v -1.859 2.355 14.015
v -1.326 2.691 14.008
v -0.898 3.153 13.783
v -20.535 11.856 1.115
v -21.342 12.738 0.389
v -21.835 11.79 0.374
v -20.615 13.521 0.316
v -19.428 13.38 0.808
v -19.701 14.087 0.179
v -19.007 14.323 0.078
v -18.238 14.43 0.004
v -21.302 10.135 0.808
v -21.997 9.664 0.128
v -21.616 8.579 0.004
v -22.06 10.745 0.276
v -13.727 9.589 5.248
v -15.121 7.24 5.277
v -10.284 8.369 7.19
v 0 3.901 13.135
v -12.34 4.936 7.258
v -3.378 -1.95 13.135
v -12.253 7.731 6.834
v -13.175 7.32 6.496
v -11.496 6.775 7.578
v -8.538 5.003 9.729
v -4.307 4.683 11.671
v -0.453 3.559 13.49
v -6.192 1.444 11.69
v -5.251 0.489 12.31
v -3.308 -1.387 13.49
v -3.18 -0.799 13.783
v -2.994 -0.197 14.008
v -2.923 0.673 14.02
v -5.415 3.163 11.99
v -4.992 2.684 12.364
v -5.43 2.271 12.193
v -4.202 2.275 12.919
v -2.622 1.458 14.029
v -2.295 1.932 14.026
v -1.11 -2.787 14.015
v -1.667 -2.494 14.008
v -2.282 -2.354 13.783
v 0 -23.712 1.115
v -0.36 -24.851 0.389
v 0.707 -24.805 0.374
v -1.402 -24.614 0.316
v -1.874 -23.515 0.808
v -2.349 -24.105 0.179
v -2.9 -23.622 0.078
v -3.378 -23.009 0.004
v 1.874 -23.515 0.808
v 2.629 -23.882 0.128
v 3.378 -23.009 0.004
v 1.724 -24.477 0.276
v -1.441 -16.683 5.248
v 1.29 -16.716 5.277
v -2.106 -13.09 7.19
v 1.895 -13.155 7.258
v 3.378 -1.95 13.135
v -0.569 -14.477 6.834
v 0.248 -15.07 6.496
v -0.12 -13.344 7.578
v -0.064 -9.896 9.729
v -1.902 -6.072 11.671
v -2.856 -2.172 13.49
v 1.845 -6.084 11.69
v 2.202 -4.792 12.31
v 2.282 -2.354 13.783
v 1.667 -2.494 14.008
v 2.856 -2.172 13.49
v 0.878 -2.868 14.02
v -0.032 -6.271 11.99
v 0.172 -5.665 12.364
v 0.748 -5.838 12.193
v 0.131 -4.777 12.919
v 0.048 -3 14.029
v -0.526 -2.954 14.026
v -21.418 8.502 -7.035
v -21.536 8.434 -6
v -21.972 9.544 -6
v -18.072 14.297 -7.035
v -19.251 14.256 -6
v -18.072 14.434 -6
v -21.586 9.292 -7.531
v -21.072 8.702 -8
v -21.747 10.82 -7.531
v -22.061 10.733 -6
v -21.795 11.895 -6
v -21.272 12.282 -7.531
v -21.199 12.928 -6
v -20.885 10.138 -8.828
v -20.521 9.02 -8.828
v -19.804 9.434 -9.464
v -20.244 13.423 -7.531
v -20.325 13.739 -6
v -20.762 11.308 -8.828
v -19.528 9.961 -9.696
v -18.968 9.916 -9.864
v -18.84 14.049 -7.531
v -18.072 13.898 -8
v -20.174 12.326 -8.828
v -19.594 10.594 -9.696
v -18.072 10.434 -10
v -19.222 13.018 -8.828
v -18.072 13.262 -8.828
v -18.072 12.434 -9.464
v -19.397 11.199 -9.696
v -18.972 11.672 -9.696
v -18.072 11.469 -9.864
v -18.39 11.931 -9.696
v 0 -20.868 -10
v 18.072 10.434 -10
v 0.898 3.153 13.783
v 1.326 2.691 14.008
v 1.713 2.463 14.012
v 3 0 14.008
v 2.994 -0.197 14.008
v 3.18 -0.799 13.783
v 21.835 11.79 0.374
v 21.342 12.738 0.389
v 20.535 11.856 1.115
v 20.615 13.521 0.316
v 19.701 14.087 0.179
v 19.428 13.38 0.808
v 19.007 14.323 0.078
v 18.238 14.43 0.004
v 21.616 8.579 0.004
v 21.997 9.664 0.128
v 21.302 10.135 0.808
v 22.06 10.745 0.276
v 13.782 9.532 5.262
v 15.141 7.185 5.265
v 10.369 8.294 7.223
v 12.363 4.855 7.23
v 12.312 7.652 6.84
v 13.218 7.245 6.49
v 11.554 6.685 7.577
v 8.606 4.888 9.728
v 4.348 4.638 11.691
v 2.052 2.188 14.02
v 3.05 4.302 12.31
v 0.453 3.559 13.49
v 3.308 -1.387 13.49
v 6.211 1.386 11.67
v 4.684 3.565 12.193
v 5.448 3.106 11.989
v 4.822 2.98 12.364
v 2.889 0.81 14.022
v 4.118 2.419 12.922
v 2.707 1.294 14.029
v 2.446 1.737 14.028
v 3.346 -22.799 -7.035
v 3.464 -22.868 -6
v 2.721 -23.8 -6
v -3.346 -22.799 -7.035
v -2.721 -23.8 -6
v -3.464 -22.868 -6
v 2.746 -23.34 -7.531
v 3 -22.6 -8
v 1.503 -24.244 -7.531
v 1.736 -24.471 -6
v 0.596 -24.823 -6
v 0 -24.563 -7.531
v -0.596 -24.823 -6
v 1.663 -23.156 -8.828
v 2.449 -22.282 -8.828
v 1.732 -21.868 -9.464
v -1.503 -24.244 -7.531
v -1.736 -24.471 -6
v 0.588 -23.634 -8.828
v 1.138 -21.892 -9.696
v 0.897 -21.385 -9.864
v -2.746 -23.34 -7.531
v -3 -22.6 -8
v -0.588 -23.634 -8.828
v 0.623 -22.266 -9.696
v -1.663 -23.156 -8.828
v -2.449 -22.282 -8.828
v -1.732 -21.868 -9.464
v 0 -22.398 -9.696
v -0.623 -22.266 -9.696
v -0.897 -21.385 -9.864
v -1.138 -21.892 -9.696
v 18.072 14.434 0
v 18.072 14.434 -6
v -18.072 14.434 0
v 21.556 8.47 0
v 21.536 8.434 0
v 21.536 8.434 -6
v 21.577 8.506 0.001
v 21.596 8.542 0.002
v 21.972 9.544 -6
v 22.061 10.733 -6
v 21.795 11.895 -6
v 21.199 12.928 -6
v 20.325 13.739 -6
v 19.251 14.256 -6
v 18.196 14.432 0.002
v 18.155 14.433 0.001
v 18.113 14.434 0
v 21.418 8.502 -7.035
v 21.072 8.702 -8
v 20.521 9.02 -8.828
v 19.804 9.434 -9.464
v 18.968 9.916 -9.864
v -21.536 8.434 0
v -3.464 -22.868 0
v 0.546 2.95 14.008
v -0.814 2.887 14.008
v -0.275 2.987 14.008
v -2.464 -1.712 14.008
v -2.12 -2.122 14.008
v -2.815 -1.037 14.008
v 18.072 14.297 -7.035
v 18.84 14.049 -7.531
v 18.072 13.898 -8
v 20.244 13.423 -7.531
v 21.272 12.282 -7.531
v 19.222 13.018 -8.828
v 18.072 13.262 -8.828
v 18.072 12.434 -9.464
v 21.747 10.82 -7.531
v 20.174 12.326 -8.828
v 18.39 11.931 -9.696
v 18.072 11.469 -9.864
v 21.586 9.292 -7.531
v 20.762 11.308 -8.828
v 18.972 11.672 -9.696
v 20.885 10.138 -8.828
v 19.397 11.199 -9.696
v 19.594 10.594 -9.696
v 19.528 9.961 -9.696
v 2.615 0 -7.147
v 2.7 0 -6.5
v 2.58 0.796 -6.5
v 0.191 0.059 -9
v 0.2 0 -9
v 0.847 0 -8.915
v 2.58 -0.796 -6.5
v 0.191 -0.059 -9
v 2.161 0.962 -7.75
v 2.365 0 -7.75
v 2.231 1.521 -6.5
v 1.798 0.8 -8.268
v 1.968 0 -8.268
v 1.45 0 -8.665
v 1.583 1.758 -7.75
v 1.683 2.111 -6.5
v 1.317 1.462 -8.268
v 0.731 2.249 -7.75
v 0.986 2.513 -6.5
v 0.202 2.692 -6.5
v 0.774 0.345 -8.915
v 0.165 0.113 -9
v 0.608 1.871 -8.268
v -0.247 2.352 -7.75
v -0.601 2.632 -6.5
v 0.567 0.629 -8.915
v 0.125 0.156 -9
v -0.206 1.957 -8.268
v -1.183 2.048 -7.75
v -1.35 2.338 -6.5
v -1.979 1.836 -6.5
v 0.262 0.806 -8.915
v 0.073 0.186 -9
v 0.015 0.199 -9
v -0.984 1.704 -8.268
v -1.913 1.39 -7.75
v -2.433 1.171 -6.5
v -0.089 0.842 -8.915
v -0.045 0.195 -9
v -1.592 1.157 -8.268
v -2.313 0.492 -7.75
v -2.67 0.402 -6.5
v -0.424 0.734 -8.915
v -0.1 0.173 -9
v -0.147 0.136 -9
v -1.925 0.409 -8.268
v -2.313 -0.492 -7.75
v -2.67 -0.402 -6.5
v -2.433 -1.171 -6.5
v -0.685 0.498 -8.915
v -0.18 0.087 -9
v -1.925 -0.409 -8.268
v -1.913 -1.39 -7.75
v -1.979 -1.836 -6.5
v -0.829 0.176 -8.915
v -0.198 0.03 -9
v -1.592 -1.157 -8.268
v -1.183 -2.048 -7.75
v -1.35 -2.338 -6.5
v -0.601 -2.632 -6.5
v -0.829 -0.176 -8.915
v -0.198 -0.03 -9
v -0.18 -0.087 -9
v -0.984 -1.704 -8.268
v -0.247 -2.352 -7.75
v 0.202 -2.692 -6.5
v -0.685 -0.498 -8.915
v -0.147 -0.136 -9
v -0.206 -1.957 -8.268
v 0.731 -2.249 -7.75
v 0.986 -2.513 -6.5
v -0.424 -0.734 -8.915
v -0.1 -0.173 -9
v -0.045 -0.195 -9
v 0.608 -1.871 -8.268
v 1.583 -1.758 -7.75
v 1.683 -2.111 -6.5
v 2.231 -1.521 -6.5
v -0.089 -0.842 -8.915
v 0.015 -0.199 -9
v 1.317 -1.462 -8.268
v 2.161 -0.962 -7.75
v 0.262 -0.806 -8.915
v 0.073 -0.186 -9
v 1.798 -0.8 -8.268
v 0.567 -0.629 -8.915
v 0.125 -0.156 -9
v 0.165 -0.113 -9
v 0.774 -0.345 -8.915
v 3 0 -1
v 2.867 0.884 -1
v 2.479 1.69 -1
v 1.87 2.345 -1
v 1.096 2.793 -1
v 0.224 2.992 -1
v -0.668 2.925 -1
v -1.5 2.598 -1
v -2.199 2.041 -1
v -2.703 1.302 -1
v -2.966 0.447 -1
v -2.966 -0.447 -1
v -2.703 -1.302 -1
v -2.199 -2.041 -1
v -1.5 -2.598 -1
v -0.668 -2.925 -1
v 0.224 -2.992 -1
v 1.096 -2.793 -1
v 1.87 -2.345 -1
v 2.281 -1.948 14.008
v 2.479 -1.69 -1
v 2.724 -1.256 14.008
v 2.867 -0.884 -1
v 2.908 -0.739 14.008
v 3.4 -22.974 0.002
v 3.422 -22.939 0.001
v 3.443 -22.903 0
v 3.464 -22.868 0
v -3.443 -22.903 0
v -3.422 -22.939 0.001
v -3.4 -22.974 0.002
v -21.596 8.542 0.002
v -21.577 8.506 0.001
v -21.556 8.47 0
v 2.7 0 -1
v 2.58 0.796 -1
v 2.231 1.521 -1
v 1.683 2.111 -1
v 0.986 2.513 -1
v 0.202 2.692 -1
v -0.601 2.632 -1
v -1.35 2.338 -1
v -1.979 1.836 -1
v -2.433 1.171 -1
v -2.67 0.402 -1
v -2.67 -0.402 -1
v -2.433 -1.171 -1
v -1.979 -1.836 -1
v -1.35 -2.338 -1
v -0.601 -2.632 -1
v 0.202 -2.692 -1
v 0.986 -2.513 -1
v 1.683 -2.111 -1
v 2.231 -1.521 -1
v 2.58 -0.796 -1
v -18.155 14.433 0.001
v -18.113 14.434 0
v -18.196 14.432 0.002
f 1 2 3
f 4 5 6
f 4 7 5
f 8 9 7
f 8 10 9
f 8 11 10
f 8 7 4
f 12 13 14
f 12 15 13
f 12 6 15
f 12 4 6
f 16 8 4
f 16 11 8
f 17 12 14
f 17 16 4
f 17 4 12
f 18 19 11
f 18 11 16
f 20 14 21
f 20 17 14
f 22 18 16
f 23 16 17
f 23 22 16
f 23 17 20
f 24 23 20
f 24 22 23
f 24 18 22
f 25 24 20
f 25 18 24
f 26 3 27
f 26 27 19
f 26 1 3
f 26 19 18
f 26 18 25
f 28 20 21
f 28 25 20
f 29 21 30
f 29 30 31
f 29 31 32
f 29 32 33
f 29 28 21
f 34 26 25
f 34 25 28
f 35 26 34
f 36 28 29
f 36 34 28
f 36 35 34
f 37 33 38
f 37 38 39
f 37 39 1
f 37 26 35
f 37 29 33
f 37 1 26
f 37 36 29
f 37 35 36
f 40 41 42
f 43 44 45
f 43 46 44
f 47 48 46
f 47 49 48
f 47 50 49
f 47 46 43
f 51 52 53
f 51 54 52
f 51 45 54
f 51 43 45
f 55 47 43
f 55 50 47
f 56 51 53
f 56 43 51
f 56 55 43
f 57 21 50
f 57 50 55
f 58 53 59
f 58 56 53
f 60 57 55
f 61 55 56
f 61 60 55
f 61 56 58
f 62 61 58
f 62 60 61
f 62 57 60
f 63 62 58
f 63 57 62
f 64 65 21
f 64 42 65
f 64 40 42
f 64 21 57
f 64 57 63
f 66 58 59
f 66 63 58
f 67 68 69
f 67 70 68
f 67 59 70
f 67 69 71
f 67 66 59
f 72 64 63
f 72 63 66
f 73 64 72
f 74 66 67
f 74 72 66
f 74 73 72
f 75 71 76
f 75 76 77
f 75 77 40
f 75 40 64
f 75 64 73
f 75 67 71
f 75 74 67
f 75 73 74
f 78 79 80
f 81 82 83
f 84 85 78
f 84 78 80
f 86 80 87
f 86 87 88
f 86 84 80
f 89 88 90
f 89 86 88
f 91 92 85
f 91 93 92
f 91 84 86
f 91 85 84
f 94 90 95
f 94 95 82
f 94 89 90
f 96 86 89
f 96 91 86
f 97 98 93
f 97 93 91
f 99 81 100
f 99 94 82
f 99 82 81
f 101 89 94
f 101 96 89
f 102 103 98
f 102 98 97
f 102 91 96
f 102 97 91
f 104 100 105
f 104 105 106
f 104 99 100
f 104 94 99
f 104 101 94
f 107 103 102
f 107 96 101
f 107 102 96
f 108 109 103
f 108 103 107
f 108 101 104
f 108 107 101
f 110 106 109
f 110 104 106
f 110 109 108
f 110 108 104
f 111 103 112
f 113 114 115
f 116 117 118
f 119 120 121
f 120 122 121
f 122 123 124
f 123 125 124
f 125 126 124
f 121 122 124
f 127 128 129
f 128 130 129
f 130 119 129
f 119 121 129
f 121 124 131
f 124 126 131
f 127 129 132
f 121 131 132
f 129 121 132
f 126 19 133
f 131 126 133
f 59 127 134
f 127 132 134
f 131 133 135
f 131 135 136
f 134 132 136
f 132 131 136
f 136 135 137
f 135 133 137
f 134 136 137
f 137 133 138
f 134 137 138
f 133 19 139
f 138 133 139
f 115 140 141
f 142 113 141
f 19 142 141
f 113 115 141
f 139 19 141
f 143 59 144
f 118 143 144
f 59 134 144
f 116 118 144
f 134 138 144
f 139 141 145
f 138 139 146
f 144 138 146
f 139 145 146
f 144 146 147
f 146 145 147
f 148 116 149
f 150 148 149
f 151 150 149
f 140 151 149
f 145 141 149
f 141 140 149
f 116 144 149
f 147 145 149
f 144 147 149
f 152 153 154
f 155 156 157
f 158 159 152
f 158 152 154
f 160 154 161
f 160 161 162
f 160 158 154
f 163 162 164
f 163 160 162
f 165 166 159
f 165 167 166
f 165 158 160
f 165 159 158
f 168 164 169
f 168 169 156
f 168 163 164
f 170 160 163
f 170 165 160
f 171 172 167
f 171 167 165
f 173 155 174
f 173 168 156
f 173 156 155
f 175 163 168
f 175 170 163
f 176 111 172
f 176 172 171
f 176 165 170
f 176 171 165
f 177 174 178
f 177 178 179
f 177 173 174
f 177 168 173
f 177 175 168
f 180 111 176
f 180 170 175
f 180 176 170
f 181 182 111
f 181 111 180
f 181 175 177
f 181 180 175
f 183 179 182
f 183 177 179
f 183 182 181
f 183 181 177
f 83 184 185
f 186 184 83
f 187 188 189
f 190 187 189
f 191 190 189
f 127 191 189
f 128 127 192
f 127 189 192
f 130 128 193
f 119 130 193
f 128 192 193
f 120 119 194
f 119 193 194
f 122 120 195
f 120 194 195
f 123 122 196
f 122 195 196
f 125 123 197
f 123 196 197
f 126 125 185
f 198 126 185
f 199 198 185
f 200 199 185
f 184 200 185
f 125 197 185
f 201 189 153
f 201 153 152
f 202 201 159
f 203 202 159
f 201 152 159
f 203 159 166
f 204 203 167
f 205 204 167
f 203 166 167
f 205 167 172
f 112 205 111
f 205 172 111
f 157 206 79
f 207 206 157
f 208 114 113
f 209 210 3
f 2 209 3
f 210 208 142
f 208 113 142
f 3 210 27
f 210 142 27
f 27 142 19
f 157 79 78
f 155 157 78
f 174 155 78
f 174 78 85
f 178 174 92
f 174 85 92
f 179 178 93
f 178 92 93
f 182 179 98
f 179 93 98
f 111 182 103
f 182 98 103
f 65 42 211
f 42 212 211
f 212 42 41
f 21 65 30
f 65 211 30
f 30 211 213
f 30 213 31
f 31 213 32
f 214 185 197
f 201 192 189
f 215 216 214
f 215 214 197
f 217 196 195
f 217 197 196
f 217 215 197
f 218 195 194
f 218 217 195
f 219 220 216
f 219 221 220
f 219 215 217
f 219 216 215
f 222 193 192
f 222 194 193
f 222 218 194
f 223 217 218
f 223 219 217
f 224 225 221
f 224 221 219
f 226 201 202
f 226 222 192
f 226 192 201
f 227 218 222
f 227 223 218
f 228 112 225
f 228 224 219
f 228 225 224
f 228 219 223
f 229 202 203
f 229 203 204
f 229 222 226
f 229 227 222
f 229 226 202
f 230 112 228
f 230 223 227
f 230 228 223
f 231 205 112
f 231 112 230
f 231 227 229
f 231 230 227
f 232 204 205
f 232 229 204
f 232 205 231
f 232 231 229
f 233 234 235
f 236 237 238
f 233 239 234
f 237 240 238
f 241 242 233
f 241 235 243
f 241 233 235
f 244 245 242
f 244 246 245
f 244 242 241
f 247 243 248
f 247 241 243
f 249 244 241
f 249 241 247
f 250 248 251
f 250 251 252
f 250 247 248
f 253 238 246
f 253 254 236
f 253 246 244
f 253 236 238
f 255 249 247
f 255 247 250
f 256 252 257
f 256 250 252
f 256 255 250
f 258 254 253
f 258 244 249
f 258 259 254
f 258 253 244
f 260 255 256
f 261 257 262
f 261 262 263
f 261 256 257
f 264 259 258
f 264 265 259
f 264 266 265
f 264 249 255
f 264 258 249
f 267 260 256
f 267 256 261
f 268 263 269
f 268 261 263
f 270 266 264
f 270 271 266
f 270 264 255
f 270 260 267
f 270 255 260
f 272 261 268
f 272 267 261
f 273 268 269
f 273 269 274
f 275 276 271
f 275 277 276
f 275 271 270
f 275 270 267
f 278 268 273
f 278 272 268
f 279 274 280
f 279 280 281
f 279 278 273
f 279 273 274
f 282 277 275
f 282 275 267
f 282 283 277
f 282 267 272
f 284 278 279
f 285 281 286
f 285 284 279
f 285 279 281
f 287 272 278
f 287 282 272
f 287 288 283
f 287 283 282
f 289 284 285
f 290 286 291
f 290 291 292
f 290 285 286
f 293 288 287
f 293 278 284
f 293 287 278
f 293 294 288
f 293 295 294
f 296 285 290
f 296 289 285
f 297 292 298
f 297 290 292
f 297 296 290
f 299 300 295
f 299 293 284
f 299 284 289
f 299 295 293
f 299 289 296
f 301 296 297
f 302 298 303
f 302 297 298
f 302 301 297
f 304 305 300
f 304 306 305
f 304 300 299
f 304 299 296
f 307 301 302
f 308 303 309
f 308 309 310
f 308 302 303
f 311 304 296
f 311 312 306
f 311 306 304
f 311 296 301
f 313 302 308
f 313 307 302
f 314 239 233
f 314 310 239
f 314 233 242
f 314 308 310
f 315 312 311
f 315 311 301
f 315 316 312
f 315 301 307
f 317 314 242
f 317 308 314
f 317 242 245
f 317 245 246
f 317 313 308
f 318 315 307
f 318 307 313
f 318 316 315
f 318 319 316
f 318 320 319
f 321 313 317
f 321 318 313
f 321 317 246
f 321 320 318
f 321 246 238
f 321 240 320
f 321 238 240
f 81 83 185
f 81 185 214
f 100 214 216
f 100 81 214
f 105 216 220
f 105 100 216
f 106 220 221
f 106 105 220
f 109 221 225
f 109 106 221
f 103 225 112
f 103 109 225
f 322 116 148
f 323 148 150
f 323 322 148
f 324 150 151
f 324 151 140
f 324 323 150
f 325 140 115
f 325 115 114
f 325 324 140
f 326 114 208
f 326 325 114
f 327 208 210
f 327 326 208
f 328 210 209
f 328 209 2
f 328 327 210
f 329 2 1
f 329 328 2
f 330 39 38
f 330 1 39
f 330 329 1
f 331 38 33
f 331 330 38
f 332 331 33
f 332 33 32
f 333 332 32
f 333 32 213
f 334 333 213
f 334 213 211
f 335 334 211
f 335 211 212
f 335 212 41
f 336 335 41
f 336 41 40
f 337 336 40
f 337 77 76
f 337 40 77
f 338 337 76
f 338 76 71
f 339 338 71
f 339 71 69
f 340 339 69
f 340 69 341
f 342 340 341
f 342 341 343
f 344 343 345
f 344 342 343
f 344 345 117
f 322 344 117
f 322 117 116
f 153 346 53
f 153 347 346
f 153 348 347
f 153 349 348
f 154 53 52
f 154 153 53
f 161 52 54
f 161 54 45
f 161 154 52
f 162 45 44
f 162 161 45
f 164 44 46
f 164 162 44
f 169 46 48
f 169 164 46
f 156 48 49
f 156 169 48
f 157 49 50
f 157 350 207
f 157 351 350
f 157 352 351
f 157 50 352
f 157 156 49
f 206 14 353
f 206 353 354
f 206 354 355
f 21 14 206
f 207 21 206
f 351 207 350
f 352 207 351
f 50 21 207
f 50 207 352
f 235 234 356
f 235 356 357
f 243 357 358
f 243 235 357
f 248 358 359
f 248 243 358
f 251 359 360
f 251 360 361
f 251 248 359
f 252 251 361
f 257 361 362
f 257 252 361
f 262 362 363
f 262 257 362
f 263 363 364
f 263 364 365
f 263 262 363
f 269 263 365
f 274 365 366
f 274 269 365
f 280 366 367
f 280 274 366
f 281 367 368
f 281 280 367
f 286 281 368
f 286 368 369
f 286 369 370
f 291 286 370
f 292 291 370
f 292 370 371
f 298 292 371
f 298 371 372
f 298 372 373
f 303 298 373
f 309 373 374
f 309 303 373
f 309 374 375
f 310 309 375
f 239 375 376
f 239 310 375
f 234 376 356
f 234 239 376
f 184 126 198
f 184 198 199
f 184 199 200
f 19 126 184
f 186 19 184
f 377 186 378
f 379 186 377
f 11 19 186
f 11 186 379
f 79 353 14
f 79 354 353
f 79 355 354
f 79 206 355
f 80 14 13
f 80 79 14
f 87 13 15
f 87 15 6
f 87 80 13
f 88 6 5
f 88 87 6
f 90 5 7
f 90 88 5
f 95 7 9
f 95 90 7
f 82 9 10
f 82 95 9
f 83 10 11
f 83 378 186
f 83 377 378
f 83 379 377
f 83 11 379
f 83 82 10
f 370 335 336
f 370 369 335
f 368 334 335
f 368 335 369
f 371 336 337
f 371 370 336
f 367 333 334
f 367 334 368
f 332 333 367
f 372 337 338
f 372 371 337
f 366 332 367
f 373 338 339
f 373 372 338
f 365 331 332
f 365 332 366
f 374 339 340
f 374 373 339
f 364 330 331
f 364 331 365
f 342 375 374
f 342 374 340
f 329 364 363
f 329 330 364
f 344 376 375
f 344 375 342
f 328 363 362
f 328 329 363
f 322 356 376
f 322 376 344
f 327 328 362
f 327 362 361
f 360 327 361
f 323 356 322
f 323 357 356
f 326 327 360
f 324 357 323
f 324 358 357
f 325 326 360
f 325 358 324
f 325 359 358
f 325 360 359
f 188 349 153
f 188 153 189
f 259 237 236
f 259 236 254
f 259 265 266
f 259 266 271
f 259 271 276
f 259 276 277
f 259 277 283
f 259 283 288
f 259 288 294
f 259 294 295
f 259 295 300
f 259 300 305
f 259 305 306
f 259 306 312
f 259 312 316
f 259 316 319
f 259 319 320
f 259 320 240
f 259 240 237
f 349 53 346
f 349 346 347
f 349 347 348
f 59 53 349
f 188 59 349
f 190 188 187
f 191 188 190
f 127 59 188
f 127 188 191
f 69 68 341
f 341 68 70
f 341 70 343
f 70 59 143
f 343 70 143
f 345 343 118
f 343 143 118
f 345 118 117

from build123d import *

# Parameters (mm, degrees)
F4_R          = 5
F9_DEPTH      = 10
F10_T1_DEPTH  = 23.3205080757
F10_T3_DEPTH  = 36.1435935394
F10_T5_DEPTH  = 36.1435935394
F10_T7_DEPTH  = 36.1435935394
F10_T12_DEPTH = 4
F10_T18_DEPTH = 4
F10_T24_DEPTH = 4
F6_R          = 2.7
F11_DEPTH     = 8
F8_R          = 3
F12_DEPTH     = 25
F13_R         = 2.5


# Not quite as in the source:
# - a fillet or chamfer that OpenCascade refuses, or shapes differently, is made with other operations: its cross-section is extruded or revolved along the edge and cut away or added


with BuildPart() as f3:
    # F0 (on Top) → F3 section 0
    with BuildSketch(Plane.XY, mode=Mode.PRIVATE) as f3_s0:
        Polygon((25, 14.4337567297), (-25, 14.4337567297), (0, -28.8675134595), align=None)
    loft([f3_s0.sketch, Vertex(0, 0, 18)])

    # F4
    f4_edges = [f3.edges().sort_by_distance(p)[0] for p in [
        (12.5, 7.216878, 9),
        (0, -14.433757, 9),
        (-12.5, 7.216878, 9),
    ]]
    fillet(f4_edges, radius=F4_R)

    # F0 (on Top) → F9 (join)
    with BuildSketch(Plane.XY):
        Polygon((25, 14.4337567297), (-25, 14.4337567297), (0, -28.8675134595), align=None)
    extrude(amount=-F9_DEPTH)

    # F10: fillet of radius 4 on 6 edges, made by hand

    # F10_s2 → F10_t1 (cut)
    with BuildSketch(Plane.XY.offset(-6)):
        with BuildLine():
            ThreePointArc((21.5358983849, 8.4337567297), (21.5358983849, 12.4337567297), (18.0717967697, 14.4337567297))
            Line((18.0717967697, 14.4337567297), (25, 14.4337567297))
            Line((25, 14.4337567297), (21.5358983849, 8.4337567297))
        make_face()
        with BuildLine():
            ThreePointArc((-21.5358983849, 8.4337567297), (-21.5358983849, 12.4337567297), (-18.0717967697, 14.4337567297))
            Line((-18.0717967697, 14.4337567297), (-25, 14.4337567297))
            Line((-25, 14.4337567297), (-21.5358983849, 8.4337567297))
        make_face()
        with BuildLine():
            ThreePointArc((3.4641016151, -22.8675134595), (0, -24.8675134595), (-3.4641016151, -22.8675134595))
            Line((-3.4641016151, -22.8675134595), (0, -28.8675134595))
            Line((0, -28.8675134595), (3.4641016151, -22.8675134595))
        make_face()
    extrude(amount=F10_T1_DEPTH, mode=Mode.SUBTRACT)

    # F10_s4 → F10_t3 (cut)
    with BuildSketch(Plane.YZ.offset(-18.0717967697)):
        with BuildLine():
            ThreePointArc((14.4337567297, -6), (13.2621838545, -8.8284271247), (10.4337567297, -10))
            Line((10.4337567297, -10), (14.4337567297, -10))
            Line((14.4337567297, -10), (14.4337567297, -6))
        make_face()
    extrude(amount=F10_T3_DEPTH, mode=Mode.SUBTRACT)

    # F10_s6 → F10_t5 (cut)
    with BuildSketch(Plane(origin=(-9.0358983849, 15.6506350946, 0), x_dir=(0, 0, 1), z_dir=(0.5, -0.8660254038, 0))):
        with BuildLine():
            ThreePointArc((-6, 14.4337567297), (-8.8284271247, 13.2621838545), (-10, 10.4337567297))
            Line((-10, 10.4337567297), (-10, 14.4337567297))
            Line((-10, 14.4337567297), (-6, 14.4337567297))
        make_face()
    extrude(amount=F10_T5_DEPTH, mode=Mode.SUBTRACT)

    # F10_s8 → F10_t7 (cut)
    with BuildSketch(Plane(origin=(-9.0358983849, -15.6506350946, 0), x_dir=(0, 0, 1), z_dir=(0.5, 0.8660254038, 0))):
        with BuildLine():
            ThreePointArc((-6, 14.4337567297), (-8.8284271247, 13.2621838545), (-10, 10.4337567297))
            Line((-10, 10.4337567297), (-10, 14.4337567297))
            Line((-10, 14.4337567297), (-6, 14.4337567297))
        make_face()
    extrude(amount=F10_T7_DEPTH, mode=Mode.SUBTRACT)


with BuildPart() as f10_tool10:
    # F10_s11 → F10_t12 (new body)
    with BuildSketch(Plane.XY.offset(-6)):
        Polygon((18.0717967697, 10.4337567297), (21.5358983849, 8.4337567297), (25, 14.4337567297), (18.0717967697, 14.4337567297), align=None)
    extrude(amount=-F10_T12_DEPTH)

    # F10_s13 → F10_t14 (revolve, cut)
    with BuildSketch(Plane(origin=(18.0717967697, 10.4337567297, -6), x_dir=(-0.8660254038, -0.5, 0), z_dir=(0.5, -0.8660254038, 0))):
        with BuildLine():
            ThreePointArc((0, -4), (4, 0), (0, 4))
            Line((0, 4), (0, -4))
        make_face()
    revolve(axis=Axis((18.0717967697, 10.4337567297, -6), (0, 0, -1)), mode=Mode.SUBTRACT)


with BuildPart() as f3_1:
    add(f3.part)

    # F10_t9: cut F10_tool10
    add(f10_tool10.part, mode=Mode.SUBTRACT)


with BuildPart() as f10_tool16:
    # F10_s17 → F10_t18 (new body)
    with BuildSketch(Plane.XY.offset(-6)):
        Polygon((-18.0717967697, 10.4337567297), (-21.5358983849, 8.4337567297), (-25, 14.4337567297), (-18.0717967697, 14.4337567297), align=None)
    extrude(amount=-F10_T18_DEPTH)

    # F10_s19 → F10_t20 (revolve, cut)
    with BuildSketch(Plane(origin=(-18.0717967697, 10.4337567297, -6), x_dir=(0.8660254038, -0.5, 0), z_dir=(0.5, 0.8660254038, 0))):
        with BuildLine():
            ThreePointArc((0, -4), (4, 0), (0, 4))
            Line((0, 4), (0, -4))
        make_face()
    revolve(axis=Axis((-18.0717967697, 10.4337567297, -6), (0, 0, -1)), mode=Mode.SUBTRACT)


with BuildPart() as f3_2:
    add(f3_1.part)

    # F10_t15: cut F10_tool16
    add(f10_tool16.part, mode=Mode.SUBTRACT)


with BuildPart() as f10_tool22:
    # F10_s23 → F10_t24 (new body)
    with BuildSketch(Plane.XY.offset(-6)):
        Polygon((0, -20.8675134595), (3.4641016151, -22.8675134595), (0, -28.8675134595), (-3.4641016151, -22.8675134595), align=None)
    extrude(amount=-F10_T24_DEPTH)

    # F10_s25 → F10_t26 (revolve, cut)
    with BuildSketch(Plane(origin=(0, -20.8675134595, -6), x_dir=(0, 1, 0), z_dir=(-1, 0, 0))):
        with BuildLine():
            ThreePointArc((0, -4), (4, 0), (0, 4))
            Line((0, 4), (0, -4))
        make_face()
    revolve(axis=Axis((0, -20.8675134595, -6), (0, 0, -1)), mode=Mode.SUBTRACT)


with BuildPart() as f3_3:
    add(f3_2.part)

    # F10_t21: cut F10_tool22
    add(f10_tool22.part, mode=Mode.SUBTRACT)

    # F6 (on offset) → F11 (cut)
    with BuildSketch(Plane.XY.offset(-9)):
        Circle(F6_R)
    extrude(amount=F11_DEPTH, mode=Mode.SUBTRACT)

    # F8 (on offset) → F12 (cut)
    with BuildSketch(Plane.XY.offset(-1)):
        Circle(F8_R)
    extrude(amount=F12_DEPTH, mode=Mode.SUBTRACT)

    # F13
    f13_edges = [f3_3.edges().sort_by_distance(p)[0] for p in [
        (-2.7, 0, -9),
    ]]
    fillet(f13_edges, radius=F13_R)


solid = f3_3.part
